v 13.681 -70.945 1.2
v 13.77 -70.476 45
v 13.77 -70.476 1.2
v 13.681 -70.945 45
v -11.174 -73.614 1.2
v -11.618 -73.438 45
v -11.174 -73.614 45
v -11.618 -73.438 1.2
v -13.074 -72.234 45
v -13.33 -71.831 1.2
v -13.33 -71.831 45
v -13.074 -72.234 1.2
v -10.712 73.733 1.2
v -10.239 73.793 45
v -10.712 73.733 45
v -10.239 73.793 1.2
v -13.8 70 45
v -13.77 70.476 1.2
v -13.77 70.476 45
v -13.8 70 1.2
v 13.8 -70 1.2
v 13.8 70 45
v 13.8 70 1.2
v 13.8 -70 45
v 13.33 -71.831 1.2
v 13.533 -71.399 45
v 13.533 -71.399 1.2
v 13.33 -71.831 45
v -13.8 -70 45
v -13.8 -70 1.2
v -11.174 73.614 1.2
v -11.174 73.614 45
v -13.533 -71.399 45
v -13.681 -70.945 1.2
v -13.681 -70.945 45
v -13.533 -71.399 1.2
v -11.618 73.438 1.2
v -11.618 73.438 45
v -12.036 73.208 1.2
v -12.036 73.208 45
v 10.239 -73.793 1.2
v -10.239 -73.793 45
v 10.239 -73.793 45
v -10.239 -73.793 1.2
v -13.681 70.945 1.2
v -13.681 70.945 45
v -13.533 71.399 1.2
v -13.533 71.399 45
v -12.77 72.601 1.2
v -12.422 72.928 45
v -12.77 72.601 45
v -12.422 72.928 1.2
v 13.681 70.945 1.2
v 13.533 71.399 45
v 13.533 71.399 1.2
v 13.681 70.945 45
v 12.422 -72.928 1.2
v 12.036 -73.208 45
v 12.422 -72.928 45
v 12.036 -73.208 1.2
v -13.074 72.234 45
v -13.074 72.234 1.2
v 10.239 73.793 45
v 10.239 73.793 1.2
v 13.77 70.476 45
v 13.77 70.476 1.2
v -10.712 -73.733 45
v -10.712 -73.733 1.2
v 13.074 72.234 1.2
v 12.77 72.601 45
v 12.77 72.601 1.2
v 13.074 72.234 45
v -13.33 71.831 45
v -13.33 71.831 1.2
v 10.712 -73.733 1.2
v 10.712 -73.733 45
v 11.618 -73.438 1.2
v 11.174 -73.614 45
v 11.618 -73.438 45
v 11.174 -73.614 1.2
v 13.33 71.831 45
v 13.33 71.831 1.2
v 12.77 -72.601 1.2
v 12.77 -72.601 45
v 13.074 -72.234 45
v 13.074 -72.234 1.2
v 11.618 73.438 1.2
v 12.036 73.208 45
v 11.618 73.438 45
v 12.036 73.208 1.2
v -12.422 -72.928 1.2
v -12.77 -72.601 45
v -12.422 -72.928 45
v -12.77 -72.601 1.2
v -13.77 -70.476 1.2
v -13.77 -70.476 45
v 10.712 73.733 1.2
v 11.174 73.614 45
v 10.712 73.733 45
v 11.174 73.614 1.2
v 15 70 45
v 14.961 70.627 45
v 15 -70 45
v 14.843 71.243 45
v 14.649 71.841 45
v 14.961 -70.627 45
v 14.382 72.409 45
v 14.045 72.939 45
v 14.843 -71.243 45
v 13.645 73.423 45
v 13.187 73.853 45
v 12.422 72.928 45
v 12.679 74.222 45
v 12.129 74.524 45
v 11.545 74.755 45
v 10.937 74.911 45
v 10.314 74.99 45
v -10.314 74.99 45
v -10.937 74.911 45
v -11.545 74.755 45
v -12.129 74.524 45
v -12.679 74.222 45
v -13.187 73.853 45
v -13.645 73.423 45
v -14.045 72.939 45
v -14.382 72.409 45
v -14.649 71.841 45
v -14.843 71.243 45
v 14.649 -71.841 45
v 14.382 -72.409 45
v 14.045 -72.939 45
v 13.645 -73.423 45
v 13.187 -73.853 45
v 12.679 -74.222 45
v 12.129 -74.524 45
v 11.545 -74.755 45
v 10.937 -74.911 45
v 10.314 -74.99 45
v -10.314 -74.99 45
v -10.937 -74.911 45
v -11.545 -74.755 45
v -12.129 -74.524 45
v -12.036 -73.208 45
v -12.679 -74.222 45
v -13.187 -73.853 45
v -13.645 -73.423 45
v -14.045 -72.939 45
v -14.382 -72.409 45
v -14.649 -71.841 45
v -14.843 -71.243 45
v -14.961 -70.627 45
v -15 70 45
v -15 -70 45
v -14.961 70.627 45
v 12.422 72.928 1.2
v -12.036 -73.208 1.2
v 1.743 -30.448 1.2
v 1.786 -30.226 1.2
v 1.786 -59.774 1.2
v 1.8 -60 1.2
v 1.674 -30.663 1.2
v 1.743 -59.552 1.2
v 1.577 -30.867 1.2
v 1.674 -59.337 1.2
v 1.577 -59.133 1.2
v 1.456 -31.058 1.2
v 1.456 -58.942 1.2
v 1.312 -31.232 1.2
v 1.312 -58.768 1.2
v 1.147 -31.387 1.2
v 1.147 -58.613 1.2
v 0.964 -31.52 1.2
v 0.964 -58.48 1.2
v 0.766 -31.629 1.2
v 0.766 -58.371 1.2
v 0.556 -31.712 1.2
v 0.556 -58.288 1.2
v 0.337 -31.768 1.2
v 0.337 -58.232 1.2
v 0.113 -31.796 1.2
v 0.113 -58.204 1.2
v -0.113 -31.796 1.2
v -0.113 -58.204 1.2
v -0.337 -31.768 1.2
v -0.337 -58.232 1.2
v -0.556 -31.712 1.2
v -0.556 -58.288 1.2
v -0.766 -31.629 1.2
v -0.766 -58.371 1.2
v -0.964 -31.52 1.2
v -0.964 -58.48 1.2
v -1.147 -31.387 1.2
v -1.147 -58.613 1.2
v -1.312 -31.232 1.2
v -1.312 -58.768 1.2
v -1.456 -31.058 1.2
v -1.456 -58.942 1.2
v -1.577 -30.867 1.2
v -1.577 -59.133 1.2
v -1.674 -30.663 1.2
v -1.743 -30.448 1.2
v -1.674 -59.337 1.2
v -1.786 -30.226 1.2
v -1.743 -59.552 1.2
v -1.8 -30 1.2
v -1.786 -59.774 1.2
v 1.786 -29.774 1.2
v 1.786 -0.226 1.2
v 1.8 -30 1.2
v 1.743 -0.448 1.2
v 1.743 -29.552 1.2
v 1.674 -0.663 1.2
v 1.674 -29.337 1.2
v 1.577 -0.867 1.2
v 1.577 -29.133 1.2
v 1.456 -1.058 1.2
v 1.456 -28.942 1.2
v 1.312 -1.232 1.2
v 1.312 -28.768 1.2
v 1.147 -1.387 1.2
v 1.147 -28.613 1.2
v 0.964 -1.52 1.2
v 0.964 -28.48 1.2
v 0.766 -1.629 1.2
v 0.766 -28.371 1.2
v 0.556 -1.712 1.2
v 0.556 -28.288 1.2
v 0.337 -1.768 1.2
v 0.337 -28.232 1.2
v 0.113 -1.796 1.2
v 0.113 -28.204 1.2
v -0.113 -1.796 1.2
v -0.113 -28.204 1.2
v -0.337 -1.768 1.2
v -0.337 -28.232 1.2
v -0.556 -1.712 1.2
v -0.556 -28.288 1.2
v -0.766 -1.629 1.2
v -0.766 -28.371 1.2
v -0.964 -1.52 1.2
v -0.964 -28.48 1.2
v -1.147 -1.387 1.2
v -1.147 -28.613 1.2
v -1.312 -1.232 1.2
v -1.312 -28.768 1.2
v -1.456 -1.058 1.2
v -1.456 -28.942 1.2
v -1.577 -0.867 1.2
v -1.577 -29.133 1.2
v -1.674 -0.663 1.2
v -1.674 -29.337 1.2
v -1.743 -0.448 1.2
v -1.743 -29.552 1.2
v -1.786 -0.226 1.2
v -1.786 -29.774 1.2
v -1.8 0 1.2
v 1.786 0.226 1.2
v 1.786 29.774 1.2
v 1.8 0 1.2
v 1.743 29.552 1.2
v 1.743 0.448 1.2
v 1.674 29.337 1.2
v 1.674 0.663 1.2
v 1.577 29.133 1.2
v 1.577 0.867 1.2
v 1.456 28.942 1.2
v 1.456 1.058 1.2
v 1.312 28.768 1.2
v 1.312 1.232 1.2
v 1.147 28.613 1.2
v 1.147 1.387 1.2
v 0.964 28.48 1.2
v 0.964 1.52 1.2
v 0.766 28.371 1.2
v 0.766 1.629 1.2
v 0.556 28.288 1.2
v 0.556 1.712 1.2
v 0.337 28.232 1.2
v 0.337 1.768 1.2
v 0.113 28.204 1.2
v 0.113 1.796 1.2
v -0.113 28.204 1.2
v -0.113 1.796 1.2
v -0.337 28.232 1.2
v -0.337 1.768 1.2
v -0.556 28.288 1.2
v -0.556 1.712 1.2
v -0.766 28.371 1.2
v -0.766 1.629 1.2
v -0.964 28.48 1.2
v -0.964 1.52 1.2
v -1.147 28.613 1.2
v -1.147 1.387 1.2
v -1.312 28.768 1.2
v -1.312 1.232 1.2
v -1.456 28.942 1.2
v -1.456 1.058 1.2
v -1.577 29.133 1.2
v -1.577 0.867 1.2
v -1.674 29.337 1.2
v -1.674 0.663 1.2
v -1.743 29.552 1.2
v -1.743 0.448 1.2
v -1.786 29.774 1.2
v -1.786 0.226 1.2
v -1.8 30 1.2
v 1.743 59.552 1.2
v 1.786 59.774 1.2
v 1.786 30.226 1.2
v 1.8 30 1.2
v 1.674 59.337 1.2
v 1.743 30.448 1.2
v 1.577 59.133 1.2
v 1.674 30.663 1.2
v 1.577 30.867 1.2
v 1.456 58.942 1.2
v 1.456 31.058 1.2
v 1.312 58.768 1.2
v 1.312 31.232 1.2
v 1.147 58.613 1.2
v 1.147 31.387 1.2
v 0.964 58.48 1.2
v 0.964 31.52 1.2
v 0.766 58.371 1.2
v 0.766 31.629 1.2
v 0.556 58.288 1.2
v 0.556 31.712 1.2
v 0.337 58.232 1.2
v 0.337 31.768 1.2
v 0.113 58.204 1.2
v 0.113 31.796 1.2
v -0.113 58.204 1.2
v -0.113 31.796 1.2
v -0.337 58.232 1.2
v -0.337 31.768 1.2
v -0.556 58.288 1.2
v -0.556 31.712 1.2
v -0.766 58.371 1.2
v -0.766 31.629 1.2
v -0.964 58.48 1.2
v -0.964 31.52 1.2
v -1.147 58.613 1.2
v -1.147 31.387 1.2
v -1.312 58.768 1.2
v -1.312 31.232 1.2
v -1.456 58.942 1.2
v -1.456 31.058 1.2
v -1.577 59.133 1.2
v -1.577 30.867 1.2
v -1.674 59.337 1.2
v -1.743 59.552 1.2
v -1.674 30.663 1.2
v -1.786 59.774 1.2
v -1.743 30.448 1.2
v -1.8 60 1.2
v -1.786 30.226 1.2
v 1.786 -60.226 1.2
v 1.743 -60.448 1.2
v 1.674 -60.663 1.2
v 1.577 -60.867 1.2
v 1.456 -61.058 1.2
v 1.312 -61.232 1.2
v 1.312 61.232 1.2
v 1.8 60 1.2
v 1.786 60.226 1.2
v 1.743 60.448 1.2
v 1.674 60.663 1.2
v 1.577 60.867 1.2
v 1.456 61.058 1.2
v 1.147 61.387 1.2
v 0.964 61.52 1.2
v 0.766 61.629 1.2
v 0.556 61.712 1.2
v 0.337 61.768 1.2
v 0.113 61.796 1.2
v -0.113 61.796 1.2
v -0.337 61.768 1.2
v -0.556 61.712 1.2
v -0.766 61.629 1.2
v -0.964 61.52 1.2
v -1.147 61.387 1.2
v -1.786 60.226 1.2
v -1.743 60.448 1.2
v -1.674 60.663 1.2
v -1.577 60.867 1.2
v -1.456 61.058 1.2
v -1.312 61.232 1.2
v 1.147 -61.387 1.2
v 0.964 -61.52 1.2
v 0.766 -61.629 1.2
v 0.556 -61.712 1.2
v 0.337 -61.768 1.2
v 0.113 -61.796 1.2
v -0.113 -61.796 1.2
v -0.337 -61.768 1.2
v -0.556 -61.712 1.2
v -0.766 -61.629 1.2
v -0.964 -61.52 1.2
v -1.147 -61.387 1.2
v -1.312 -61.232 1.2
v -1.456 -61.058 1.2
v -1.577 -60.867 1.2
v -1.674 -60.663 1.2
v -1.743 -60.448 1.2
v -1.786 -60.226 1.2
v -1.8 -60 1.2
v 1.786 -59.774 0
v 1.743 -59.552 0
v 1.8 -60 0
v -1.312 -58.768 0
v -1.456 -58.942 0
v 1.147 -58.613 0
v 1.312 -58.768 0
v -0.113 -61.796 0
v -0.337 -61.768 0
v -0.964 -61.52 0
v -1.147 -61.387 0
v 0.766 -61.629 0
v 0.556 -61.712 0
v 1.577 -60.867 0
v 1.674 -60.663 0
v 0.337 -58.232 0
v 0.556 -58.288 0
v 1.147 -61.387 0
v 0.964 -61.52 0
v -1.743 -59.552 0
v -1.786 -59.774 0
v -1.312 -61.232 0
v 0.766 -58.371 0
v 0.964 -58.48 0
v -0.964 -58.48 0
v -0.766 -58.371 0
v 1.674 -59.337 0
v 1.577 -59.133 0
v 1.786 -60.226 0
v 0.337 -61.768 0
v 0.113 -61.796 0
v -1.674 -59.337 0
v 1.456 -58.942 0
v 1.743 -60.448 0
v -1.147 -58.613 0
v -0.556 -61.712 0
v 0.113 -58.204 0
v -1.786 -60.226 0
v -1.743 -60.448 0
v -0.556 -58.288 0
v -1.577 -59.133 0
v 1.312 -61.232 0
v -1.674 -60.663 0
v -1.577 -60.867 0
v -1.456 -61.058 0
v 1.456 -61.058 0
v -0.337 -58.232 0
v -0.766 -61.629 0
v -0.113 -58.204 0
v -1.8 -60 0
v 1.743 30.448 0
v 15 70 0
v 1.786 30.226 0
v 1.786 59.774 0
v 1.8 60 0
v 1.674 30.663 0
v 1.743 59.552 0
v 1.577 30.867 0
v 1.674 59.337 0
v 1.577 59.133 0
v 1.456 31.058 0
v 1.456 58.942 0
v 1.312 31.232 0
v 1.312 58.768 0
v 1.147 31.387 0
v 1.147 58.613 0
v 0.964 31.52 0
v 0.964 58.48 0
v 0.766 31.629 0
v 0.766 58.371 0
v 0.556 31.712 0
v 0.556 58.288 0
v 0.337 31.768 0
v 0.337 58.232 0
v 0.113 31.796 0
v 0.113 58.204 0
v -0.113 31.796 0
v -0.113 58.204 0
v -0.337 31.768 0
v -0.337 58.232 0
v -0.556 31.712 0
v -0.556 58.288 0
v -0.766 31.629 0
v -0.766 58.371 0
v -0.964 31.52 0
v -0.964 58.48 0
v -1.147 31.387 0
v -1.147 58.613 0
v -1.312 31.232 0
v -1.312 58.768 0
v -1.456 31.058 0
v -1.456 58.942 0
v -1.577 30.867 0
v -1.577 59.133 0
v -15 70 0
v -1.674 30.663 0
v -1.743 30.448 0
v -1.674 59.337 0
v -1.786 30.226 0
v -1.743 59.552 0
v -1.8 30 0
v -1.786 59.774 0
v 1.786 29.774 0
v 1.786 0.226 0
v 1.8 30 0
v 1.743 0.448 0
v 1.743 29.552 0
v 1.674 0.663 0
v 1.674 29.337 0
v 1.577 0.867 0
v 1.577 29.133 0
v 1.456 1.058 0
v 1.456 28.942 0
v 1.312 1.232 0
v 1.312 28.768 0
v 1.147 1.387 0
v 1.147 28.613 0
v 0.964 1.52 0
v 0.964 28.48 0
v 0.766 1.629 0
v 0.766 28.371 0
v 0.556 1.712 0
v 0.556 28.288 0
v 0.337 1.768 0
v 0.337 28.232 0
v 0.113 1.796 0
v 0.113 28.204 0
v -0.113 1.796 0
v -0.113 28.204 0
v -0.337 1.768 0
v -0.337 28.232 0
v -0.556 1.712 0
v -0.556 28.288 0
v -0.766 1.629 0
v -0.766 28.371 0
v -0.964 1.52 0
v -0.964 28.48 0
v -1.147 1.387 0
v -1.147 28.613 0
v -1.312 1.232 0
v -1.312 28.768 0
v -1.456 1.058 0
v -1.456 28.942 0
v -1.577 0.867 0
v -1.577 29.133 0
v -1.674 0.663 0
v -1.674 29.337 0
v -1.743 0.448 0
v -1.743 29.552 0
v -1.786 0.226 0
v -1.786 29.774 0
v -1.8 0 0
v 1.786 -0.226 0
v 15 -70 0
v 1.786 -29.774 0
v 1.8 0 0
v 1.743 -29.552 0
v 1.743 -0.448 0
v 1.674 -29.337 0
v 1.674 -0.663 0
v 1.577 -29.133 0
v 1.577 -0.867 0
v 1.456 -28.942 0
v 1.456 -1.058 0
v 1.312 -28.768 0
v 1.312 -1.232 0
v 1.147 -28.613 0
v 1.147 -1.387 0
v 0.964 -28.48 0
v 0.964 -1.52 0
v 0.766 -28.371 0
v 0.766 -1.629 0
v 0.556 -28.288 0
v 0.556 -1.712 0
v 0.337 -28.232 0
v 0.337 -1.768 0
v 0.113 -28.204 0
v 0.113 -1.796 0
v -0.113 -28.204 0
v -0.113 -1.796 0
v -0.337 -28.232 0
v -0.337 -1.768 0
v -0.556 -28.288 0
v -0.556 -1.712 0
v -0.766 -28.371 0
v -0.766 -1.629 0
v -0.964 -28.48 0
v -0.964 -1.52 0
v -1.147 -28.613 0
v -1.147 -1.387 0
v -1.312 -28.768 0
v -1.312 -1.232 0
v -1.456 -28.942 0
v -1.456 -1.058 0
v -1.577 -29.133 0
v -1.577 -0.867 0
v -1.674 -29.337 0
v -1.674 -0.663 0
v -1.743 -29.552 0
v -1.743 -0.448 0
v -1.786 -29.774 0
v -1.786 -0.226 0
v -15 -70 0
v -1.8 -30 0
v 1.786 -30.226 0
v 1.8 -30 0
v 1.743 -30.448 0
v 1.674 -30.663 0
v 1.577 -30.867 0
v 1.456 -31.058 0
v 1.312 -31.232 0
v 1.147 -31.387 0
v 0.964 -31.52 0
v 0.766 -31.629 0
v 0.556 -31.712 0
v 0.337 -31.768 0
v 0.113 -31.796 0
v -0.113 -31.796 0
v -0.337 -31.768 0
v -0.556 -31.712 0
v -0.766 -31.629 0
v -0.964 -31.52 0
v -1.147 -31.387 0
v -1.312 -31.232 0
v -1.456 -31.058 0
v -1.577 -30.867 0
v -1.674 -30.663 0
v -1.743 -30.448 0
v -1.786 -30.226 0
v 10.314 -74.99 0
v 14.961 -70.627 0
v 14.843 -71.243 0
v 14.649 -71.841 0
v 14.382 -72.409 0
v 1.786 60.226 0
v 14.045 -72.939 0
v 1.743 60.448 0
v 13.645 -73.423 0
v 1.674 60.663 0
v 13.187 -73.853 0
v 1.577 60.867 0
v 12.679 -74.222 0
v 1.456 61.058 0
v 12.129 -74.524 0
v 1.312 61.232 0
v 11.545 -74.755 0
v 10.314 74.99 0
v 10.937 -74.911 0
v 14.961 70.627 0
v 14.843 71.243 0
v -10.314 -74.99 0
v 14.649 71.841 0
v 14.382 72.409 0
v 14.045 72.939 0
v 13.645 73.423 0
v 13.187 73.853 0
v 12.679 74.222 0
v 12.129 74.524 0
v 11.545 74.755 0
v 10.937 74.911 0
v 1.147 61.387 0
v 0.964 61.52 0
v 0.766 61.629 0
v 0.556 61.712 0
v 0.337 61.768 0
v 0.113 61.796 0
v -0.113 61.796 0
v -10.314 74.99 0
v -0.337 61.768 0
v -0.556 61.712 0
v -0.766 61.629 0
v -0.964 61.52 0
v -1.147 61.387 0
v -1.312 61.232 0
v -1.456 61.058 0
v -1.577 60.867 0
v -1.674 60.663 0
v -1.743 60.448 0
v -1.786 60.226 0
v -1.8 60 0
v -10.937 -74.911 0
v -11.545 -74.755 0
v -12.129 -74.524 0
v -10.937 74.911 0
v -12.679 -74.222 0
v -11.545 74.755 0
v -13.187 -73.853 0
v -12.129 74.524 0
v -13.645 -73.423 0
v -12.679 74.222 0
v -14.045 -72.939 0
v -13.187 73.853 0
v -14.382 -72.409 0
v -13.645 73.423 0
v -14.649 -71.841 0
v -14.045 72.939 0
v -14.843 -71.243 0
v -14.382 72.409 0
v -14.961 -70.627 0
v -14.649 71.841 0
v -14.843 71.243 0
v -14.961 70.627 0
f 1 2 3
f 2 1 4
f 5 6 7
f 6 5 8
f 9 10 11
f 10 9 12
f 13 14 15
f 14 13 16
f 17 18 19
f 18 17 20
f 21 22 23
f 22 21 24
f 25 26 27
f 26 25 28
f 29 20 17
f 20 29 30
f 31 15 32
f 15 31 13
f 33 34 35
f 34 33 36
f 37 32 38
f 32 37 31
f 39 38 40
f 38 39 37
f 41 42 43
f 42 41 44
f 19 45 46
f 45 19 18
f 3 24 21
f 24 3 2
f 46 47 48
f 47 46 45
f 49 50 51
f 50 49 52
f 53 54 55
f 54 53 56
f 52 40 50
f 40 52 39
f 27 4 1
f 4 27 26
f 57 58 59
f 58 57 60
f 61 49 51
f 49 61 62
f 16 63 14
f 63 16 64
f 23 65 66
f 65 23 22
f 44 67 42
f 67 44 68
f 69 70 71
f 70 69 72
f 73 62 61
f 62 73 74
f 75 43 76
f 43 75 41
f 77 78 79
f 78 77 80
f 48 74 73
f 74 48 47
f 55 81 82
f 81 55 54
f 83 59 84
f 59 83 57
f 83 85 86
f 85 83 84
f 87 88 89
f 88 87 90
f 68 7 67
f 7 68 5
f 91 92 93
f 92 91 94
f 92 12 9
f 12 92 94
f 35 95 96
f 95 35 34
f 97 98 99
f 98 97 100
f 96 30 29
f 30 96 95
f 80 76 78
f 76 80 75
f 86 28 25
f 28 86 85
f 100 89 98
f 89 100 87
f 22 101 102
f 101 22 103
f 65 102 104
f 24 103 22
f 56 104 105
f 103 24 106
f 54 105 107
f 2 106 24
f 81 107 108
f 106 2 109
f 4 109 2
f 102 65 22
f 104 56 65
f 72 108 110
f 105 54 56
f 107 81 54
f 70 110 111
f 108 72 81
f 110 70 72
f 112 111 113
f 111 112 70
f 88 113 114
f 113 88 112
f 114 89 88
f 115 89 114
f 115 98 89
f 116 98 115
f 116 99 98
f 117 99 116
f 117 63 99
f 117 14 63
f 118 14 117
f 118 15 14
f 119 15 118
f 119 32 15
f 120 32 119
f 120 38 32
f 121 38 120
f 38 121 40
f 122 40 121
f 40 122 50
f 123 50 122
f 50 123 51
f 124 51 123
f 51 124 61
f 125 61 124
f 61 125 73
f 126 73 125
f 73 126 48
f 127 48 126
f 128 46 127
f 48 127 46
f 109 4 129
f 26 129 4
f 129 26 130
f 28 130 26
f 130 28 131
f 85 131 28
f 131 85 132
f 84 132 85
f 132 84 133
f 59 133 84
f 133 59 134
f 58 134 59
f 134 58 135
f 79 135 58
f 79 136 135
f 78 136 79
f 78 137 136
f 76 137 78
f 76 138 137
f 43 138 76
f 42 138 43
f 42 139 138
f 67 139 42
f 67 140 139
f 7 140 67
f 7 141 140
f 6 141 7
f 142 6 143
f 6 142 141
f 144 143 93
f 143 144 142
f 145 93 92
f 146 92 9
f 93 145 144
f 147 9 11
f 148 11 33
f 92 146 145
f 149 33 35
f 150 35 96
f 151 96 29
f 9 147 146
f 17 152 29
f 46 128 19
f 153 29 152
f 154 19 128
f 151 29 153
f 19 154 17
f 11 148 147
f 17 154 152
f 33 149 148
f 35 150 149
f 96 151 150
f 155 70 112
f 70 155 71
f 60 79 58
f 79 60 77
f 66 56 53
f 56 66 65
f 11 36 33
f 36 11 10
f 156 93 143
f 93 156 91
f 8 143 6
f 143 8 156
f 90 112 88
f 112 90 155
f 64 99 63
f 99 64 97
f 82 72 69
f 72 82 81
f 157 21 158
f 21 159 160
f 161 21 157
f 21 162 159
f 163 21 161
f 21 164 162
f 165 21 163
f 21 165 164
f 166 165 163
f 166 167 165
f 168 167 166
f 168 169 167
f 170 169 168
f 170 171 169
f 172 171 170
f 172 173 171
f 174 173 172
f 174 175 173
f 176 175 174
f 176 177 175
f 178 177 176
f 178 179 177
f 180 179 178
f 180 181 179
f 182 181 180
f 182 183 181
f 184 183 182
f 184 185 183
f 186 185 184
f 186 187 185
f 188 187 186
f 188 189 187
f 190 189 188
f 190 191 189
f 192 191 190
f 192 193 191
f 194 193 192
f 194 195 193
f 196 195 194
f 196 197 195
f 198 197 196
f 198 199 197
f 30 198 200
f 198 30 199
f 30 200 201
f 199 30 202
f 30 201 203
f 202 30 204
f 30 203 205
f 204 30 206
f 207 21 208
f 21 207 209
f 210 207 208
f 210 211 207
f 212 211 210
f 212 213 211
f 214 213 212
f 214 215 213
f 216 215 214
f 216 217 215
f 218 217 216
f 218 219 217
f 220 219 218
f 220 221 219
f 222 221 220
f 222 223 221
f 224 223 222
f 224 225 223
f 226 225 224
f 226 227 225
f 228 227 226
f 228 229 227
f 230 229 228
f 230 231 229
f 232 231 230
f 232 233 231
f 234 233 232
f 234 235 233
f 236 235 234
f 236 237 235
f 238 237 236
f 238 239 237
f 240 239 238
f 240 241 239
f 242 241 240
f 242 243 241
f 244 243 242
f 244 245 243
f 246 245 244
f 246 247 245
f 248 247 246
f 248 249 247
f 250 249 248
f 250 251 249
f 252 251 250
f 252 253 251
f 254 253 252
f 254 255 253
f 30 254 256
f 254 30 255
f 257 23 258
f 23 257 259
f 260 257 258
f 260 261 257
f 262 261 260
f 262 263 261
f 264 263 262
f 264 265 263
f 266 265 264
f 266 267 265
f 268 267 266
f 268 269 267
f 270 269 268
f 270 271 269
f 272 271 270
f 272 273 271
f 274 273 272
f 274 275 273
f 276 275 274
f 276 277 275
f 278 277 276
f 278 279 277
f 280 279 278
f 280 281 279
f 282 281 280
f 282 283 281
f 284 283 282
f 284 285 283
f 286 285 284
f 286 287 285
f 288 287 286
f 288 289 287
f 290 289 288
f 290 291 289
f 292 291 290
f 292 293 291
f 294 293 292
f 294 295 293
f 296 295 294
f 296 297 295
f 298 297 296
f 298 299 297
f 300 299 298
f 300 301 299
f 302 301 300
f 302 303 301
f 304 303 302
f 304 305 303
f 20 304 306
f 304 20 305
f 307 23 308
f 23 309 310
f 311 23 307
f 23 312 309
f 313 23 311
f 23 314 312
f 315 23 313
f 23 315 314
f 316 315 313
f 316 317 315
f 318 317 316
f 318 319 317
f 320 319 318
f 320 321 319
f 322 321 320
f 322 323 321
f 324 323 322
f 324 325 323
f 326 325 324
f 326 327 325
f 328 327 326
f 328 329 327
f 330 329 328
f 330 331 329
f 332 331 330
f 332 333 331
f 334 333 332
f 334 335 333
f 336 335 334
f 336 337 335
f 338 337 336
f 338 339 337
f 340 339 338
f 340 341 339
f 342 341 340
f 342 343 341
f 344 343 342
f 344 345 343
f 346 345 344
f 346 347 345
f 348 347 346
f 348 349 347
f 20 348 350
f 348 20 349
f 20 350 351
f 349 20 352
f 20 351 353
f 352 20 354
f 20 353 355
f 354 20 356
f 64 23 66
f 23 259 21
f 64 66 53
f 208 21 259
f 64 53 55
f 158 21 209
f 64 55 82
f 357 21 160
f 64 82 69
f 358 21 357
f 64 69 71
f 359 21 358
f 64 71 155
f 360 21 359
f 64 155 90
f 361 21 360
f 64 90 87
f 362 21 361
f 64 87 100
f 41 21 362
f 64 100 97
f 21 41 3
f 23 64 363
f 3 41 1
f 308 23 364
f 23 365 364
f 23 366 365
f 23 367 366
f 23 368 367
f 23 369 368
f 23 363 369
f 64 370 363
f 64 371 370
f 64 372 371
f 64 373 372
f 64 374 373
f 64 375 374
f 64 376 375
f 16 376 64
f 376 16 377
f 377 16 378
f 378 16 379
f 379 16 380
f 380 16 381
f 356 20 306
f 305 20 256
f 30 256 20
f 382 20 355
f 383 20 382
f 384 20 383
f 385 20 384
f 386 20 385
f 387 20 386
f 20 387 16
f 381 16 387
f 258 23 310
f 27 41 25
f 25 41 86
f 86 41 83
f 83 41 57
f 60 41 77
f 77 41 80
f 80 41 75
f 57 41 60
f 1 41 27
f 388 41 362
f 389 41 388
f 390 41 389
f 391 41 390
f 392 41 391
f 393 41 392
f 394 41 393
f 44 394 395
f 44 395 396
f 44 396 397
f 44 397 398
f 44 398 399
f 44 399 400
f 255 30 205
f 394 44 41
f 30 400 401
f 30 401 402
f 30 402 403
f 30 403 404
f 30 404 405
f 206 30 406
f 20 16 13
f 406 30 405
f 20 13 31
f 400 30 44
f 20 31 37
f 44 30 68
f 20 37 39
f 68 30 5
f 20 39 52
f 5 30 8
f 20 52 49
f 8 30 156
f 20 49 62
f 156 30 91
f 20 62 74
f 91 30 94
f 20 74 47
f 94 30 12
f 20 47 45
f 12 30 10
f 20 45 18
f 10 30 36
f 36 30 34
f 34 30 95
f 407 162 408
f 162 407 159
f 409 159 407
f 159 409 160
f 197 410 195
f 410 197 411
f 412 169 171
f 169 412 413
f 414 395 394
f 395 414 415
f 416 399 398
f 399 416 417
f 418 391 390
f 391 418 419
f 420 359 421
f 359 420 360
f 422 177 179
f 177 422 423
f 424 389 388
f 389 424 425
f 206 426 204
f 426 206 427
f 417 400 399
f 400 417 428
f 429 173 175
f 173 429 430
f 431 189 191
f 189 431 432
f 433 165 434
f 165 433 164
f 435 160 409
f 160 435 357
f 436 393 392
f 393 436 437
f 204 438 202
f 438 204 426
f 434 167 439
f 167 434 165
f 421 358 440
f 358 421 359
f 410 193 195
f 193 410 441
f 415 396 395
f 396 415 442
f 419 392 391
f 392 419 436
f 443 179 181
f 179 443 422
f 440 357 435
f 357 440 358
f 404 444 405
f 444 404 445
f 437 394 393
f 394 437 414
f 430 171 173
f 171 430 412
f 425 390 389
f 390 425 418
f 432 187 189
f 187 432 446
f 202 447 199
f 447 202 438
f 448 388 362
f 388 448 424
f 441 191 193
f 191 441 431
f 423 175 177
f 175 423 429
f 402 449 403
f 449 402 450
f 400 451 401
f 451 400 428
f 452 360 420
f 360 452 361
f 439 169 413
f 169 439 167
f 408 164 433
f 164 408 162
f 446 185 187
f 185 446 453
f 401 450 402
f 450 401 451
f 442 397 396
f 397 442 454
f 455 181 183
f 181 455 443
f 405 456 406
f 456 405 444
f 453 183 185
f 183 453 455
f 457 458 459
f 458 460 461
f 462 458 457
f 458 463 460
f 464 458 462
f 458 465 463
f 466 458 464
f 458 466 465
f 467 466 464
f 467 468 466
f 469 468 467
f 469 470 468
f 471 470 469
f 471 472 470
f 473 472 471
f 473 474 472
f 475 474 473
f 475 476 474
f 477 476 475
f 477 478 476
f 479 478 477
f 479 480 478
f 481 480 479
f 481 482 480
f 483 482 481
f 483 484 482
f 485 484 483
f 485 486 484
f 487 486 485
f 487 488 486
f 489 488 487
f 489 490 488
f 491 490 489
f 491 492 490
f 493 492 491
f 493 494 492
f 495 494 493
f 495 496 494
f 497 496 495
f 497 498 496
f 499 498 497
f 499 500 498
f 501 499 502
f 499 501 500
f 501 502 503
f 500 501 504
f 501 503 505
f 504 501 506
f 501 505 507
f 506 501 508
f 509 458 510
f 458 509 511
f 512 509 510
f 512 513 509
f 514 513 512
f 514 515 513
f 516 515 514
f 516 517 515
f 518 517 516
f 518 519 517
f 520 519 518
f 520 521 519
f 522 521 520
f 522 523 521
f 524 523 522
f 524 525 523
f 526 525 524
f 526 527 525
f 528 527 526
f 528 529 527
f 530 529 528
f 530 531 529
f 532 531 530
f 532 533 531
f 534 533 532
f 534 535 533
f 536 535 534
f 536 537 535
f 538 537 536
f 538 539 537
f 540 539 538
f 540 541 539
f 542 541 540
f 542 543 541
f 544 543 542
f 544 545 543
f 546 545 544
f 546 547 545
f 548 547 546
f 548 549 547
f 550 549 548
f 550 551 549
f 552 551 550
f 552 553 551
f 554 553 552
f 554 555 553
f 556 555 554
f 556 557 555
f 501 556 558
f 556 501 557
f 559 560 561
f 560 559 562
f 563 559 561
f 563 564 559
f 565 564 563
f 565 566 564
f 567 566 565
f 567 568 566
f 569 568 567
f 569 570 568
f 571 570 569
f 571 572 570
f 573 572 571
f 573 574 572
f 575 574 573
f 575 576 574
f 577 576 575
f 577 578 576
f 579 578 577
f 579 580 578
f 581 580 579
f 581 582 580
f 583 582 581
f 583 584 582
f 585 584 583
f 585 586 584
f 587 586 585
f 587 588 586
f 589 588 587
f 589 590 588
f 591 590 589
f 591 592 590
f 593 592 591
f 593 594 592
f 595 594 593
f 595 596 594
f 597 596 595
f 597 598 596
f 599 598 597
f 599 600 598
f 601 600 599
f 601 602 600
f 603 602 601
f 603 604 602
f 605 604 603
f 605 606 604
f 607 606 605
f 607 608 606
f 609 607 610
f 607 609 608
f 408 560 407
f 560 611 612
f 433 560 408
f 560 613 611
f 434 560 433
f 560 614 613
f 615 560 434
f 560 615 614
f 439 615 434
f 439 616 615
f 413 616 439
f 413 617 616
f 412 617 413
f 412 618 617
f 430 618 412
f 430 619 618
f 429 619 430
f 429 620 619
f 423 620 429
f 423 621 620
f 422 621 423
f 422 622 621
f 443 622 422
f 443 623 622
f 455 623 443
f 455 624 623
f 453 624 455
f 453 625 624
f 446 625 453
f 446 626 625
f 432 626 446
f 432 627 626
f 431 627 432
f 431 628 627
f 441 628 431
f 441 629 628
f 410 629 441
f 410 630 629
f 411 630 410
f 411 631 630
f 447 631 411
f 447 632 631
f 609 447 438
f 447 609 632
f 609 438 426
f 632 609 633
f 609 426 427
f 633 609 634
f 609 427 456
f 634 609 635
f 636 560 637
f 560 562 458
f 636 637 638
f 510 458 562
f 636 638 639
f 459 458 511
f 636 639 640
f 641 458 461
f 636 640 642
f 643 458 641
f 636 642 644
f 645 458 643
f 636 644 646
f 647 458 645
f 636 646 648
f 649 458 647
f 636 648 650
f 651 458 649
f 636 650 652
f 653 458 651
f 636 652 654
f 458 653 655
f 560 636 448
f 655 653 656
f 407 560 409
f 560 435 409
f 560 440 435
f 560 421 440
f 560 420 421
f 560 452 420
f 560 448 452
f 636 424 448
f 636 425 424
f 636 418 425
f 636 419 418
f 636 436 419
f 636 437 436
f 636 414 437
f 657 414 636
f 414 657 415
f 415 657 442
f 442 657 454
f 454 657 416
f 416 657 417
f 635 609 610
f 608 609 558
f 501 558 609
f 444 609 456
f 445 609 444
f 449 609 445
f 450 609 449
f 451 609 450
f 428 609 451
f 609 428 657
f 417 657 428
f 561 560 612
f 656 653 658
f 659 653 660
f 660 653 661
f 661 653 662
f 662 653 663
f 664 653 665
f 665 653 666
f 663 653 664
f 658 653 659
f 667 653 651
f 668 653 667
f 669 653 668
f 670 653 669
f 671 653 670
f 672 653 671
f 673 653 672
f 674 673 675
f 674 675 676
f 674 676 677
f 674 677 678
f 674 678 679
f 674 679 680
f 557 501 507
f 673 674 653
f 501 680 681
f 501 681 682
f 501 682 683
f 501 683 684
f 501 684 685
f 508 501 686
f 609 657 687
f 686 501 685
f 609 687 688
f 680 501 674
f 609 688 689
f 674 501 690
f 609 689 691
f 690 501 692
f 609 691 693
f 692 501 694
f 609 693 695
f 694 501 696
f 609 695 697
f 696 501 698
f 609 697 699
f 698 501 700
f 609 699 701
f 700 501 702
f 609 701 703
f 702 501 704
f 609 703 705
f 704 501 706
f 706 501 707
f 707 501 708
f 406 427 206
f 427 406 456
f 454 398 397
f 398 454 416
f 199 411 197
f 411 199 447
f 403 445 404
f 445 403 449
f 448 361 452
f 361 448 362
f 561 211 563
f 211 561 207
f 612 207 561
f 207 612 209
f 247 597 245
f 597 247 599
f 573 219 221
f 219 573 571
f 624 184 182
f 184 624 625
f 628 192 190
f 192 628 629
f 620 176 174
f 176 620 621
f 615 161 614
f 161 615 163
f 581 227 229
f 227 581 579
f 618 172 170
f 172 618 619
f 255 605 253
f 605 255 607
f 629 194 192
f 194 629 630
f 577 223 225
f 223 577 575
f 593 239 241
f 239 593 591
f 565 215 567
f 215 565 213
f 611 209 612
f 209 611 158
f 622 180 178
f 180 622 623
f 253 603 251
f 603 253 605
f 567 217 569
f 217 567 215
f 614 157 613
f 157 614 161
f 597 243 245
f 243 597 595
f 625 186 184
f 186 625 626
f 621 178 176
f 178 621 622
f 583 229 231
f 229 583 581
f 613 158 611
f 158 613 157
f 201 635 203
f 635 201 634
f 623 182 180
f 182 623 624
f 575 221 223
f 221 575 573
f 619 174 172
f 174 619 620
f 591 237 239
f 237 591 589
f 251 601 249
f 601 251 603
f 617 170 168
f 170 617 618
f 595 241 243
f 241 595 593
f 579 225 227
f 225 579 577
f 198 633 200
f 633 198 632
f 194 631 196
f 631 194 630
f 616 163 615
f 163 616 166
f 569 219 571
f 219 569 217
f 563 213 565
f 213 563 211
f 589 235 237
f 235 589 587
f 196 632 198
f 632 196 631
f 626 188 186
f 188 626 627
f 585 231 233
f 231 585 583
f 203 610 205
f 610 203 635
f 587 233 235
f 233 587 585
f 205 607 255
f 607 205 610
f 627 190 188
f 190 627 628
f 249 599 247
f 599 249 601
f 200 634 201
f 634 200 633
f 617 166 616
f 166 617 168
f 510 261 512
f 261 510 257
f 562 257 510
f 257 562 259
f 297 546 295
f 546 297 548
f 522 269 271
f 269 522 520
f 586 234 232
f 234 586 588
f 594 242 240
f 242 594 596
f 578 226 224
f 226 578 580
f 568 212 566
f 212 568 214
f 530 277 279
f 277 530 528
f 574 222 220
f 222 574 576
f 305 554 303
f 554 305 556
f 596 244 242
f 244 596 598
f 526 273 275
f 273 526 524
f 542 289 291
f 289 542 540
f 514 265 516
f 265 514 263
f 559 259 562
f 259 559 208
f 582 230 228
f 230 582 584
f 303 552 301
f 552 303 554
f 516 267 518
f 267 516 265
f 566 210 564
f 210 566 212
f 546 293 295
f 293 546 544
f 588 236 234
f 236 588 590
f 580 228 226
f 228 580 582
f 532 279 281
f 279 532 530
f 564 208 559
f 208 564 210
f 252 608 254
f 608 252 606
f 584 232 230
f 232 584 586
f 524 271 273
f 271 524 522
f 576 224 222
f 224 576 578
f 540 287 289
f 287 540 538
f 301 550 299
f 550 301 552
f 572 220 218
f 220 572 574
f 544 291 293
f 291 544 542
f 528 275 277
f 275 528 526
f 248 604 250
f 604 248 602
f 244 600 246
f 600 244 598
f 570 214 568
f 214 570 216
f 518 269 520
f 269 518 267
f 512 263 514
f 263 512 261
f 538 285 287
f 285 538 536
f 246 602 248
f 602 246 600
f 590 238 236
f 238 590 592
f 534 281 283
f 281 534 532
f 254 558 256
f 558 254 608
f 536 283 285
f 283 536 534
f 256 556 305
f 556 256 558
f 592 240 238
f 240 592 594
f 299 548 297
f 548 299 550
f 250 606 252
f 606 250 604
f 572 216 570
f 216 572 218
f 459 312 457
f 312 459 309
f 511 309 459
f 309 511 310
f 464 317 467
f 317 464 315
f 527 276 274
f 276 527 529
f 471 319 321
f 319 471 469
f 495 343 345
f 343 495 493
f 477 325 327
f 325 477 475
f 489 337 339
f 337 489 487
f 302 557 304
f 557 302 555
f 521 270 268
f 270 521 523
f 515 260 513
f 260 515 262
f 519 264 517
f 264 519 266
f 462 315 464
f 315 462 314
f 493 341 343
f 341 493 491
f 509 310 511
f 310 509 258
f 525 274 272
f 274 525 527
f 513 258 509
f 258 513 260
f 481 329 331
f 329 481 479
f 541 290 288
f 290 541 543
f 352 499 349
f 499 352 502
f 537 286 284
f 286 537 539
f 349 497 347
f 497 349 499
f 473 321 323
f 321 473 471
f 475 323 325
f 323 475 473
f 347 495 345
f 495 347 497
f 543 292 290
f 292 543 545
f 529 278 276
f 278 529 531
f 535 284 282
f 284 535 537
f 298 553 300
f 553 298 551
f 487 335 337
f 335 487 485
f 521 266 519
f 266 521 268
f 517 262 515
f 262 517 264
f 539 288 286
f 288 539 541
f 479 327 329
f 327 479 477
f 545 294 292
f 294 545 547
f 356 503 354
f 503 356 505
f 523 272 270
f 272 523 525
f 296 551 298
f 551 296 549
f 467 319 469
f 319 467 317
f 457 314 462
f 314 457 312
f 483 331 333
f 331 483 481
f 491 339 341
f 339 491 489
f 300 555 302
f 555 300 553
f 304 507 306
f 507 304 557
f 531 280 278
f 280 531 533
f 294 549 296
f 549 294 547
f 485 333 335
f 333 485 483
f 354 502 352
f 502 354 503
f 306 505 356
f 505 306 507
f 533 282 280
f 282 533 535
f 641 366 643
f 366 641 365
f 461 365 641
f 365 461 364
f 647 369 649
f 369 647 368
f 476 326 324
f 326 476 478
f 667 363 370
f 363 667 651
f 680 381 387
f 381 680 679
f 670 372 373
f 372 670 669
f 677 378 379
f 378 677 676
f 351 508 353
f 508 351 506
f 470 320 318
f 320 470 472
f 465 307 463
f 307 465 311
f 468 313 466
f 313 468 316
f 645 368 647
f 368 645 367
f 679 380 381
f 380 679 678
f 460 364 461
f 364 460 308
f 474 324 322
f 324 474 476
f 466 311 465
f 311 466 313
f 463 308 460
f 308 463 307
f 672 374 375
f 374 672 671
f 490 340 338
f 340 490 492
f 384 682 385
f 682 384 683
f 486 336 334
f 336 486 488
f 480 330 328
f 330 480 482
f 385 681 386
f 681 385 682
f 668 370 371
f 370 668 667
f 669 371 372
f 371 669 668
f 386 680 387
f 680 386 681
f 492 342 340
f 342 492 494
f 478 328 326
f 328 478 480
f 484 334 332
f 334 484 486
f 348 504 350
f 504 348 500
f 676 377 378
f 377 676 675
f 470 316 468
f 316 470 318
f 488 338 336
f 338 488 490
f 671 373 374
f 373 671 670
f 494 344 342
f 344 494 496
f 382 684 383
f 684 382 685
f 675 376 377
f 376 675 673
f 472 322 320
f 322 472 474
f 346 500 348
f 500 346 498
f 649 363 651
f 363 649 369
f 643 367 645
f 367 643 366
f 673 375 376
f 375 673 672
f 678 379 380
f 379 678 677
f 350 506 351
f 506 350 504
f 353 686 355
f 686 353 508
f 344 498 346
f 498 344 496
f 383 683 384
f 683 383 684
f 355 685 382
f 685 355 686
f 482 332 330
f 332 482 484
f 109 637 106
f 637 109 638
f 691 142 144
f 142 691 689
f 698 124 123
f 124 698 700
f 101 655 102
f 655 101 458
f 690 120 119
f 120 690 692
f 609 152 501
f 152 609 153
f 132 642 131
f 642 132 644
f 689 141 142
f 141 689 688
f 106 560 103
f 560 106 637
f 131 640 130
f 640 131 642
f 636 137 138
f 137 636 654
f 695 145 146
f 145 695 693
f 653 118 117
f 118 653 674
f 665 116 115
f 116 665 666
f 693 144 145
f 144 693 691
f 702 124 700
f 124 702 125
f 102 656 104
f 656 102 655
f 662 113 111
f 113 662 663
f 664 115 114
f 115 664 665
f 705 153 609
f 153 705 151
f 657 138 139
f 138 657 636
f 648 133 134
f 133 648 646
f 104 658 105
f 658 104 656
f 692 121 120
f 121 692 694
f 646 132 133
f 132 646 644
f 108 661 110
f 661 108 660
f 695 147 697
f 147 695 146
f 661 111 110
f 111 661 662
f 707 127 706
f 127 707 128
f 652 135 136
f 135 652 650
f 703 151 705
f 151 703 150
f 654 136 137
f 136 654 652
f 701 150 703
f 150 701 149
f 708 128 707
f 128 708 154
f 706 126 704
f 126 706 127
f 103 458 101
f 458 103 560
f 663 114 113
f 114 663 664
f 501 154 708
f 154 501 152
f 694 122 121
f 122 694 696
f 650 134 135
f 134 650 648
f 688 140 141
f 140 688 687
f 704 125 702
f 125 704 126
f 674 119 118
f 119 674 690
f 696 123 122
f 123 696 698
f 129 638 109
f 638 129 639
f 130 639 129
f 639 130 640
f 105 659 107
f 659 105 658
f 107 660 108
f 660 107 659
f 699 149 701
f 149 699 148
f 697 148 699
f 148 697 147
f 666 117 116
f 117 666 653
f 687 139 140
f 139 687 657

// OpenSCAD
$fn = 50;


difference() {
	union() {
		hull() {
			translate(v = [-10.0000000000, 70.0000000000, 0]) {
				cylinder(h = 45, r = 5);
			}
			translate(v = [10.0000000000, 70.0000000000, 0]) {
				cylinder(h = 45, r = 5);
			}
			translate(v = [-10.0000000000, -70.0000000000, 0]) {
				cylinder(h = 45, r = 5);
			}
			translate(v = [10.0000000000, -70.0000000000, 0]) {
				cylinder(h = 45, r = 5);
			}
		}
	}
	union() {
		translate(v = [0, 0, 1.2000000000]) {
			hull() {
				translate(v = [-10.0000000000, 70.0000000000, 0]) {
					cylinder(h = 43.8000000000, r = 3.8000000000);
				}
				translate(v = [10.0000000000, 70.0000000000, 0]) {
					cylinder(h = 43.8000000000, r = 3.8000000000);
				}
				translate(v = [-10.0000000000, -70.0000000000, 0]) {
					cylinder(h = 43.8000000000, r = 3.8000000000);
				}
				translate(v = [10.0000000000, -70.0000000000, 0]) {
					cylinder(h = 43.8000000000, r = 3.8000000000);
				}
			}
		}
		#translate(v = [0.0000000000, -60.0000000000, 0]) {
			cylinder(h = 1.2000000000, r = 1.8000000000);
		}
		#translate(v = [0.0000000000, -30.0000000000, 0]) {
			cylinder(h = 1.2000000000, r = 1.8000000000);
		}
		#cylinder(h = 1.2000000000, r = 1.8000000000);
		#translate(v = [0.0000000000, 30.0000000000, 0]) {
			cylinder(h = 1.2000000000, r = 1.8000000000);
		}
		#translate(v = [0.0000000000, 60.0000000000, 0]) {
			cylinder(h = 1.2000000000, r = 1.8000000000);
		}
	}
}
